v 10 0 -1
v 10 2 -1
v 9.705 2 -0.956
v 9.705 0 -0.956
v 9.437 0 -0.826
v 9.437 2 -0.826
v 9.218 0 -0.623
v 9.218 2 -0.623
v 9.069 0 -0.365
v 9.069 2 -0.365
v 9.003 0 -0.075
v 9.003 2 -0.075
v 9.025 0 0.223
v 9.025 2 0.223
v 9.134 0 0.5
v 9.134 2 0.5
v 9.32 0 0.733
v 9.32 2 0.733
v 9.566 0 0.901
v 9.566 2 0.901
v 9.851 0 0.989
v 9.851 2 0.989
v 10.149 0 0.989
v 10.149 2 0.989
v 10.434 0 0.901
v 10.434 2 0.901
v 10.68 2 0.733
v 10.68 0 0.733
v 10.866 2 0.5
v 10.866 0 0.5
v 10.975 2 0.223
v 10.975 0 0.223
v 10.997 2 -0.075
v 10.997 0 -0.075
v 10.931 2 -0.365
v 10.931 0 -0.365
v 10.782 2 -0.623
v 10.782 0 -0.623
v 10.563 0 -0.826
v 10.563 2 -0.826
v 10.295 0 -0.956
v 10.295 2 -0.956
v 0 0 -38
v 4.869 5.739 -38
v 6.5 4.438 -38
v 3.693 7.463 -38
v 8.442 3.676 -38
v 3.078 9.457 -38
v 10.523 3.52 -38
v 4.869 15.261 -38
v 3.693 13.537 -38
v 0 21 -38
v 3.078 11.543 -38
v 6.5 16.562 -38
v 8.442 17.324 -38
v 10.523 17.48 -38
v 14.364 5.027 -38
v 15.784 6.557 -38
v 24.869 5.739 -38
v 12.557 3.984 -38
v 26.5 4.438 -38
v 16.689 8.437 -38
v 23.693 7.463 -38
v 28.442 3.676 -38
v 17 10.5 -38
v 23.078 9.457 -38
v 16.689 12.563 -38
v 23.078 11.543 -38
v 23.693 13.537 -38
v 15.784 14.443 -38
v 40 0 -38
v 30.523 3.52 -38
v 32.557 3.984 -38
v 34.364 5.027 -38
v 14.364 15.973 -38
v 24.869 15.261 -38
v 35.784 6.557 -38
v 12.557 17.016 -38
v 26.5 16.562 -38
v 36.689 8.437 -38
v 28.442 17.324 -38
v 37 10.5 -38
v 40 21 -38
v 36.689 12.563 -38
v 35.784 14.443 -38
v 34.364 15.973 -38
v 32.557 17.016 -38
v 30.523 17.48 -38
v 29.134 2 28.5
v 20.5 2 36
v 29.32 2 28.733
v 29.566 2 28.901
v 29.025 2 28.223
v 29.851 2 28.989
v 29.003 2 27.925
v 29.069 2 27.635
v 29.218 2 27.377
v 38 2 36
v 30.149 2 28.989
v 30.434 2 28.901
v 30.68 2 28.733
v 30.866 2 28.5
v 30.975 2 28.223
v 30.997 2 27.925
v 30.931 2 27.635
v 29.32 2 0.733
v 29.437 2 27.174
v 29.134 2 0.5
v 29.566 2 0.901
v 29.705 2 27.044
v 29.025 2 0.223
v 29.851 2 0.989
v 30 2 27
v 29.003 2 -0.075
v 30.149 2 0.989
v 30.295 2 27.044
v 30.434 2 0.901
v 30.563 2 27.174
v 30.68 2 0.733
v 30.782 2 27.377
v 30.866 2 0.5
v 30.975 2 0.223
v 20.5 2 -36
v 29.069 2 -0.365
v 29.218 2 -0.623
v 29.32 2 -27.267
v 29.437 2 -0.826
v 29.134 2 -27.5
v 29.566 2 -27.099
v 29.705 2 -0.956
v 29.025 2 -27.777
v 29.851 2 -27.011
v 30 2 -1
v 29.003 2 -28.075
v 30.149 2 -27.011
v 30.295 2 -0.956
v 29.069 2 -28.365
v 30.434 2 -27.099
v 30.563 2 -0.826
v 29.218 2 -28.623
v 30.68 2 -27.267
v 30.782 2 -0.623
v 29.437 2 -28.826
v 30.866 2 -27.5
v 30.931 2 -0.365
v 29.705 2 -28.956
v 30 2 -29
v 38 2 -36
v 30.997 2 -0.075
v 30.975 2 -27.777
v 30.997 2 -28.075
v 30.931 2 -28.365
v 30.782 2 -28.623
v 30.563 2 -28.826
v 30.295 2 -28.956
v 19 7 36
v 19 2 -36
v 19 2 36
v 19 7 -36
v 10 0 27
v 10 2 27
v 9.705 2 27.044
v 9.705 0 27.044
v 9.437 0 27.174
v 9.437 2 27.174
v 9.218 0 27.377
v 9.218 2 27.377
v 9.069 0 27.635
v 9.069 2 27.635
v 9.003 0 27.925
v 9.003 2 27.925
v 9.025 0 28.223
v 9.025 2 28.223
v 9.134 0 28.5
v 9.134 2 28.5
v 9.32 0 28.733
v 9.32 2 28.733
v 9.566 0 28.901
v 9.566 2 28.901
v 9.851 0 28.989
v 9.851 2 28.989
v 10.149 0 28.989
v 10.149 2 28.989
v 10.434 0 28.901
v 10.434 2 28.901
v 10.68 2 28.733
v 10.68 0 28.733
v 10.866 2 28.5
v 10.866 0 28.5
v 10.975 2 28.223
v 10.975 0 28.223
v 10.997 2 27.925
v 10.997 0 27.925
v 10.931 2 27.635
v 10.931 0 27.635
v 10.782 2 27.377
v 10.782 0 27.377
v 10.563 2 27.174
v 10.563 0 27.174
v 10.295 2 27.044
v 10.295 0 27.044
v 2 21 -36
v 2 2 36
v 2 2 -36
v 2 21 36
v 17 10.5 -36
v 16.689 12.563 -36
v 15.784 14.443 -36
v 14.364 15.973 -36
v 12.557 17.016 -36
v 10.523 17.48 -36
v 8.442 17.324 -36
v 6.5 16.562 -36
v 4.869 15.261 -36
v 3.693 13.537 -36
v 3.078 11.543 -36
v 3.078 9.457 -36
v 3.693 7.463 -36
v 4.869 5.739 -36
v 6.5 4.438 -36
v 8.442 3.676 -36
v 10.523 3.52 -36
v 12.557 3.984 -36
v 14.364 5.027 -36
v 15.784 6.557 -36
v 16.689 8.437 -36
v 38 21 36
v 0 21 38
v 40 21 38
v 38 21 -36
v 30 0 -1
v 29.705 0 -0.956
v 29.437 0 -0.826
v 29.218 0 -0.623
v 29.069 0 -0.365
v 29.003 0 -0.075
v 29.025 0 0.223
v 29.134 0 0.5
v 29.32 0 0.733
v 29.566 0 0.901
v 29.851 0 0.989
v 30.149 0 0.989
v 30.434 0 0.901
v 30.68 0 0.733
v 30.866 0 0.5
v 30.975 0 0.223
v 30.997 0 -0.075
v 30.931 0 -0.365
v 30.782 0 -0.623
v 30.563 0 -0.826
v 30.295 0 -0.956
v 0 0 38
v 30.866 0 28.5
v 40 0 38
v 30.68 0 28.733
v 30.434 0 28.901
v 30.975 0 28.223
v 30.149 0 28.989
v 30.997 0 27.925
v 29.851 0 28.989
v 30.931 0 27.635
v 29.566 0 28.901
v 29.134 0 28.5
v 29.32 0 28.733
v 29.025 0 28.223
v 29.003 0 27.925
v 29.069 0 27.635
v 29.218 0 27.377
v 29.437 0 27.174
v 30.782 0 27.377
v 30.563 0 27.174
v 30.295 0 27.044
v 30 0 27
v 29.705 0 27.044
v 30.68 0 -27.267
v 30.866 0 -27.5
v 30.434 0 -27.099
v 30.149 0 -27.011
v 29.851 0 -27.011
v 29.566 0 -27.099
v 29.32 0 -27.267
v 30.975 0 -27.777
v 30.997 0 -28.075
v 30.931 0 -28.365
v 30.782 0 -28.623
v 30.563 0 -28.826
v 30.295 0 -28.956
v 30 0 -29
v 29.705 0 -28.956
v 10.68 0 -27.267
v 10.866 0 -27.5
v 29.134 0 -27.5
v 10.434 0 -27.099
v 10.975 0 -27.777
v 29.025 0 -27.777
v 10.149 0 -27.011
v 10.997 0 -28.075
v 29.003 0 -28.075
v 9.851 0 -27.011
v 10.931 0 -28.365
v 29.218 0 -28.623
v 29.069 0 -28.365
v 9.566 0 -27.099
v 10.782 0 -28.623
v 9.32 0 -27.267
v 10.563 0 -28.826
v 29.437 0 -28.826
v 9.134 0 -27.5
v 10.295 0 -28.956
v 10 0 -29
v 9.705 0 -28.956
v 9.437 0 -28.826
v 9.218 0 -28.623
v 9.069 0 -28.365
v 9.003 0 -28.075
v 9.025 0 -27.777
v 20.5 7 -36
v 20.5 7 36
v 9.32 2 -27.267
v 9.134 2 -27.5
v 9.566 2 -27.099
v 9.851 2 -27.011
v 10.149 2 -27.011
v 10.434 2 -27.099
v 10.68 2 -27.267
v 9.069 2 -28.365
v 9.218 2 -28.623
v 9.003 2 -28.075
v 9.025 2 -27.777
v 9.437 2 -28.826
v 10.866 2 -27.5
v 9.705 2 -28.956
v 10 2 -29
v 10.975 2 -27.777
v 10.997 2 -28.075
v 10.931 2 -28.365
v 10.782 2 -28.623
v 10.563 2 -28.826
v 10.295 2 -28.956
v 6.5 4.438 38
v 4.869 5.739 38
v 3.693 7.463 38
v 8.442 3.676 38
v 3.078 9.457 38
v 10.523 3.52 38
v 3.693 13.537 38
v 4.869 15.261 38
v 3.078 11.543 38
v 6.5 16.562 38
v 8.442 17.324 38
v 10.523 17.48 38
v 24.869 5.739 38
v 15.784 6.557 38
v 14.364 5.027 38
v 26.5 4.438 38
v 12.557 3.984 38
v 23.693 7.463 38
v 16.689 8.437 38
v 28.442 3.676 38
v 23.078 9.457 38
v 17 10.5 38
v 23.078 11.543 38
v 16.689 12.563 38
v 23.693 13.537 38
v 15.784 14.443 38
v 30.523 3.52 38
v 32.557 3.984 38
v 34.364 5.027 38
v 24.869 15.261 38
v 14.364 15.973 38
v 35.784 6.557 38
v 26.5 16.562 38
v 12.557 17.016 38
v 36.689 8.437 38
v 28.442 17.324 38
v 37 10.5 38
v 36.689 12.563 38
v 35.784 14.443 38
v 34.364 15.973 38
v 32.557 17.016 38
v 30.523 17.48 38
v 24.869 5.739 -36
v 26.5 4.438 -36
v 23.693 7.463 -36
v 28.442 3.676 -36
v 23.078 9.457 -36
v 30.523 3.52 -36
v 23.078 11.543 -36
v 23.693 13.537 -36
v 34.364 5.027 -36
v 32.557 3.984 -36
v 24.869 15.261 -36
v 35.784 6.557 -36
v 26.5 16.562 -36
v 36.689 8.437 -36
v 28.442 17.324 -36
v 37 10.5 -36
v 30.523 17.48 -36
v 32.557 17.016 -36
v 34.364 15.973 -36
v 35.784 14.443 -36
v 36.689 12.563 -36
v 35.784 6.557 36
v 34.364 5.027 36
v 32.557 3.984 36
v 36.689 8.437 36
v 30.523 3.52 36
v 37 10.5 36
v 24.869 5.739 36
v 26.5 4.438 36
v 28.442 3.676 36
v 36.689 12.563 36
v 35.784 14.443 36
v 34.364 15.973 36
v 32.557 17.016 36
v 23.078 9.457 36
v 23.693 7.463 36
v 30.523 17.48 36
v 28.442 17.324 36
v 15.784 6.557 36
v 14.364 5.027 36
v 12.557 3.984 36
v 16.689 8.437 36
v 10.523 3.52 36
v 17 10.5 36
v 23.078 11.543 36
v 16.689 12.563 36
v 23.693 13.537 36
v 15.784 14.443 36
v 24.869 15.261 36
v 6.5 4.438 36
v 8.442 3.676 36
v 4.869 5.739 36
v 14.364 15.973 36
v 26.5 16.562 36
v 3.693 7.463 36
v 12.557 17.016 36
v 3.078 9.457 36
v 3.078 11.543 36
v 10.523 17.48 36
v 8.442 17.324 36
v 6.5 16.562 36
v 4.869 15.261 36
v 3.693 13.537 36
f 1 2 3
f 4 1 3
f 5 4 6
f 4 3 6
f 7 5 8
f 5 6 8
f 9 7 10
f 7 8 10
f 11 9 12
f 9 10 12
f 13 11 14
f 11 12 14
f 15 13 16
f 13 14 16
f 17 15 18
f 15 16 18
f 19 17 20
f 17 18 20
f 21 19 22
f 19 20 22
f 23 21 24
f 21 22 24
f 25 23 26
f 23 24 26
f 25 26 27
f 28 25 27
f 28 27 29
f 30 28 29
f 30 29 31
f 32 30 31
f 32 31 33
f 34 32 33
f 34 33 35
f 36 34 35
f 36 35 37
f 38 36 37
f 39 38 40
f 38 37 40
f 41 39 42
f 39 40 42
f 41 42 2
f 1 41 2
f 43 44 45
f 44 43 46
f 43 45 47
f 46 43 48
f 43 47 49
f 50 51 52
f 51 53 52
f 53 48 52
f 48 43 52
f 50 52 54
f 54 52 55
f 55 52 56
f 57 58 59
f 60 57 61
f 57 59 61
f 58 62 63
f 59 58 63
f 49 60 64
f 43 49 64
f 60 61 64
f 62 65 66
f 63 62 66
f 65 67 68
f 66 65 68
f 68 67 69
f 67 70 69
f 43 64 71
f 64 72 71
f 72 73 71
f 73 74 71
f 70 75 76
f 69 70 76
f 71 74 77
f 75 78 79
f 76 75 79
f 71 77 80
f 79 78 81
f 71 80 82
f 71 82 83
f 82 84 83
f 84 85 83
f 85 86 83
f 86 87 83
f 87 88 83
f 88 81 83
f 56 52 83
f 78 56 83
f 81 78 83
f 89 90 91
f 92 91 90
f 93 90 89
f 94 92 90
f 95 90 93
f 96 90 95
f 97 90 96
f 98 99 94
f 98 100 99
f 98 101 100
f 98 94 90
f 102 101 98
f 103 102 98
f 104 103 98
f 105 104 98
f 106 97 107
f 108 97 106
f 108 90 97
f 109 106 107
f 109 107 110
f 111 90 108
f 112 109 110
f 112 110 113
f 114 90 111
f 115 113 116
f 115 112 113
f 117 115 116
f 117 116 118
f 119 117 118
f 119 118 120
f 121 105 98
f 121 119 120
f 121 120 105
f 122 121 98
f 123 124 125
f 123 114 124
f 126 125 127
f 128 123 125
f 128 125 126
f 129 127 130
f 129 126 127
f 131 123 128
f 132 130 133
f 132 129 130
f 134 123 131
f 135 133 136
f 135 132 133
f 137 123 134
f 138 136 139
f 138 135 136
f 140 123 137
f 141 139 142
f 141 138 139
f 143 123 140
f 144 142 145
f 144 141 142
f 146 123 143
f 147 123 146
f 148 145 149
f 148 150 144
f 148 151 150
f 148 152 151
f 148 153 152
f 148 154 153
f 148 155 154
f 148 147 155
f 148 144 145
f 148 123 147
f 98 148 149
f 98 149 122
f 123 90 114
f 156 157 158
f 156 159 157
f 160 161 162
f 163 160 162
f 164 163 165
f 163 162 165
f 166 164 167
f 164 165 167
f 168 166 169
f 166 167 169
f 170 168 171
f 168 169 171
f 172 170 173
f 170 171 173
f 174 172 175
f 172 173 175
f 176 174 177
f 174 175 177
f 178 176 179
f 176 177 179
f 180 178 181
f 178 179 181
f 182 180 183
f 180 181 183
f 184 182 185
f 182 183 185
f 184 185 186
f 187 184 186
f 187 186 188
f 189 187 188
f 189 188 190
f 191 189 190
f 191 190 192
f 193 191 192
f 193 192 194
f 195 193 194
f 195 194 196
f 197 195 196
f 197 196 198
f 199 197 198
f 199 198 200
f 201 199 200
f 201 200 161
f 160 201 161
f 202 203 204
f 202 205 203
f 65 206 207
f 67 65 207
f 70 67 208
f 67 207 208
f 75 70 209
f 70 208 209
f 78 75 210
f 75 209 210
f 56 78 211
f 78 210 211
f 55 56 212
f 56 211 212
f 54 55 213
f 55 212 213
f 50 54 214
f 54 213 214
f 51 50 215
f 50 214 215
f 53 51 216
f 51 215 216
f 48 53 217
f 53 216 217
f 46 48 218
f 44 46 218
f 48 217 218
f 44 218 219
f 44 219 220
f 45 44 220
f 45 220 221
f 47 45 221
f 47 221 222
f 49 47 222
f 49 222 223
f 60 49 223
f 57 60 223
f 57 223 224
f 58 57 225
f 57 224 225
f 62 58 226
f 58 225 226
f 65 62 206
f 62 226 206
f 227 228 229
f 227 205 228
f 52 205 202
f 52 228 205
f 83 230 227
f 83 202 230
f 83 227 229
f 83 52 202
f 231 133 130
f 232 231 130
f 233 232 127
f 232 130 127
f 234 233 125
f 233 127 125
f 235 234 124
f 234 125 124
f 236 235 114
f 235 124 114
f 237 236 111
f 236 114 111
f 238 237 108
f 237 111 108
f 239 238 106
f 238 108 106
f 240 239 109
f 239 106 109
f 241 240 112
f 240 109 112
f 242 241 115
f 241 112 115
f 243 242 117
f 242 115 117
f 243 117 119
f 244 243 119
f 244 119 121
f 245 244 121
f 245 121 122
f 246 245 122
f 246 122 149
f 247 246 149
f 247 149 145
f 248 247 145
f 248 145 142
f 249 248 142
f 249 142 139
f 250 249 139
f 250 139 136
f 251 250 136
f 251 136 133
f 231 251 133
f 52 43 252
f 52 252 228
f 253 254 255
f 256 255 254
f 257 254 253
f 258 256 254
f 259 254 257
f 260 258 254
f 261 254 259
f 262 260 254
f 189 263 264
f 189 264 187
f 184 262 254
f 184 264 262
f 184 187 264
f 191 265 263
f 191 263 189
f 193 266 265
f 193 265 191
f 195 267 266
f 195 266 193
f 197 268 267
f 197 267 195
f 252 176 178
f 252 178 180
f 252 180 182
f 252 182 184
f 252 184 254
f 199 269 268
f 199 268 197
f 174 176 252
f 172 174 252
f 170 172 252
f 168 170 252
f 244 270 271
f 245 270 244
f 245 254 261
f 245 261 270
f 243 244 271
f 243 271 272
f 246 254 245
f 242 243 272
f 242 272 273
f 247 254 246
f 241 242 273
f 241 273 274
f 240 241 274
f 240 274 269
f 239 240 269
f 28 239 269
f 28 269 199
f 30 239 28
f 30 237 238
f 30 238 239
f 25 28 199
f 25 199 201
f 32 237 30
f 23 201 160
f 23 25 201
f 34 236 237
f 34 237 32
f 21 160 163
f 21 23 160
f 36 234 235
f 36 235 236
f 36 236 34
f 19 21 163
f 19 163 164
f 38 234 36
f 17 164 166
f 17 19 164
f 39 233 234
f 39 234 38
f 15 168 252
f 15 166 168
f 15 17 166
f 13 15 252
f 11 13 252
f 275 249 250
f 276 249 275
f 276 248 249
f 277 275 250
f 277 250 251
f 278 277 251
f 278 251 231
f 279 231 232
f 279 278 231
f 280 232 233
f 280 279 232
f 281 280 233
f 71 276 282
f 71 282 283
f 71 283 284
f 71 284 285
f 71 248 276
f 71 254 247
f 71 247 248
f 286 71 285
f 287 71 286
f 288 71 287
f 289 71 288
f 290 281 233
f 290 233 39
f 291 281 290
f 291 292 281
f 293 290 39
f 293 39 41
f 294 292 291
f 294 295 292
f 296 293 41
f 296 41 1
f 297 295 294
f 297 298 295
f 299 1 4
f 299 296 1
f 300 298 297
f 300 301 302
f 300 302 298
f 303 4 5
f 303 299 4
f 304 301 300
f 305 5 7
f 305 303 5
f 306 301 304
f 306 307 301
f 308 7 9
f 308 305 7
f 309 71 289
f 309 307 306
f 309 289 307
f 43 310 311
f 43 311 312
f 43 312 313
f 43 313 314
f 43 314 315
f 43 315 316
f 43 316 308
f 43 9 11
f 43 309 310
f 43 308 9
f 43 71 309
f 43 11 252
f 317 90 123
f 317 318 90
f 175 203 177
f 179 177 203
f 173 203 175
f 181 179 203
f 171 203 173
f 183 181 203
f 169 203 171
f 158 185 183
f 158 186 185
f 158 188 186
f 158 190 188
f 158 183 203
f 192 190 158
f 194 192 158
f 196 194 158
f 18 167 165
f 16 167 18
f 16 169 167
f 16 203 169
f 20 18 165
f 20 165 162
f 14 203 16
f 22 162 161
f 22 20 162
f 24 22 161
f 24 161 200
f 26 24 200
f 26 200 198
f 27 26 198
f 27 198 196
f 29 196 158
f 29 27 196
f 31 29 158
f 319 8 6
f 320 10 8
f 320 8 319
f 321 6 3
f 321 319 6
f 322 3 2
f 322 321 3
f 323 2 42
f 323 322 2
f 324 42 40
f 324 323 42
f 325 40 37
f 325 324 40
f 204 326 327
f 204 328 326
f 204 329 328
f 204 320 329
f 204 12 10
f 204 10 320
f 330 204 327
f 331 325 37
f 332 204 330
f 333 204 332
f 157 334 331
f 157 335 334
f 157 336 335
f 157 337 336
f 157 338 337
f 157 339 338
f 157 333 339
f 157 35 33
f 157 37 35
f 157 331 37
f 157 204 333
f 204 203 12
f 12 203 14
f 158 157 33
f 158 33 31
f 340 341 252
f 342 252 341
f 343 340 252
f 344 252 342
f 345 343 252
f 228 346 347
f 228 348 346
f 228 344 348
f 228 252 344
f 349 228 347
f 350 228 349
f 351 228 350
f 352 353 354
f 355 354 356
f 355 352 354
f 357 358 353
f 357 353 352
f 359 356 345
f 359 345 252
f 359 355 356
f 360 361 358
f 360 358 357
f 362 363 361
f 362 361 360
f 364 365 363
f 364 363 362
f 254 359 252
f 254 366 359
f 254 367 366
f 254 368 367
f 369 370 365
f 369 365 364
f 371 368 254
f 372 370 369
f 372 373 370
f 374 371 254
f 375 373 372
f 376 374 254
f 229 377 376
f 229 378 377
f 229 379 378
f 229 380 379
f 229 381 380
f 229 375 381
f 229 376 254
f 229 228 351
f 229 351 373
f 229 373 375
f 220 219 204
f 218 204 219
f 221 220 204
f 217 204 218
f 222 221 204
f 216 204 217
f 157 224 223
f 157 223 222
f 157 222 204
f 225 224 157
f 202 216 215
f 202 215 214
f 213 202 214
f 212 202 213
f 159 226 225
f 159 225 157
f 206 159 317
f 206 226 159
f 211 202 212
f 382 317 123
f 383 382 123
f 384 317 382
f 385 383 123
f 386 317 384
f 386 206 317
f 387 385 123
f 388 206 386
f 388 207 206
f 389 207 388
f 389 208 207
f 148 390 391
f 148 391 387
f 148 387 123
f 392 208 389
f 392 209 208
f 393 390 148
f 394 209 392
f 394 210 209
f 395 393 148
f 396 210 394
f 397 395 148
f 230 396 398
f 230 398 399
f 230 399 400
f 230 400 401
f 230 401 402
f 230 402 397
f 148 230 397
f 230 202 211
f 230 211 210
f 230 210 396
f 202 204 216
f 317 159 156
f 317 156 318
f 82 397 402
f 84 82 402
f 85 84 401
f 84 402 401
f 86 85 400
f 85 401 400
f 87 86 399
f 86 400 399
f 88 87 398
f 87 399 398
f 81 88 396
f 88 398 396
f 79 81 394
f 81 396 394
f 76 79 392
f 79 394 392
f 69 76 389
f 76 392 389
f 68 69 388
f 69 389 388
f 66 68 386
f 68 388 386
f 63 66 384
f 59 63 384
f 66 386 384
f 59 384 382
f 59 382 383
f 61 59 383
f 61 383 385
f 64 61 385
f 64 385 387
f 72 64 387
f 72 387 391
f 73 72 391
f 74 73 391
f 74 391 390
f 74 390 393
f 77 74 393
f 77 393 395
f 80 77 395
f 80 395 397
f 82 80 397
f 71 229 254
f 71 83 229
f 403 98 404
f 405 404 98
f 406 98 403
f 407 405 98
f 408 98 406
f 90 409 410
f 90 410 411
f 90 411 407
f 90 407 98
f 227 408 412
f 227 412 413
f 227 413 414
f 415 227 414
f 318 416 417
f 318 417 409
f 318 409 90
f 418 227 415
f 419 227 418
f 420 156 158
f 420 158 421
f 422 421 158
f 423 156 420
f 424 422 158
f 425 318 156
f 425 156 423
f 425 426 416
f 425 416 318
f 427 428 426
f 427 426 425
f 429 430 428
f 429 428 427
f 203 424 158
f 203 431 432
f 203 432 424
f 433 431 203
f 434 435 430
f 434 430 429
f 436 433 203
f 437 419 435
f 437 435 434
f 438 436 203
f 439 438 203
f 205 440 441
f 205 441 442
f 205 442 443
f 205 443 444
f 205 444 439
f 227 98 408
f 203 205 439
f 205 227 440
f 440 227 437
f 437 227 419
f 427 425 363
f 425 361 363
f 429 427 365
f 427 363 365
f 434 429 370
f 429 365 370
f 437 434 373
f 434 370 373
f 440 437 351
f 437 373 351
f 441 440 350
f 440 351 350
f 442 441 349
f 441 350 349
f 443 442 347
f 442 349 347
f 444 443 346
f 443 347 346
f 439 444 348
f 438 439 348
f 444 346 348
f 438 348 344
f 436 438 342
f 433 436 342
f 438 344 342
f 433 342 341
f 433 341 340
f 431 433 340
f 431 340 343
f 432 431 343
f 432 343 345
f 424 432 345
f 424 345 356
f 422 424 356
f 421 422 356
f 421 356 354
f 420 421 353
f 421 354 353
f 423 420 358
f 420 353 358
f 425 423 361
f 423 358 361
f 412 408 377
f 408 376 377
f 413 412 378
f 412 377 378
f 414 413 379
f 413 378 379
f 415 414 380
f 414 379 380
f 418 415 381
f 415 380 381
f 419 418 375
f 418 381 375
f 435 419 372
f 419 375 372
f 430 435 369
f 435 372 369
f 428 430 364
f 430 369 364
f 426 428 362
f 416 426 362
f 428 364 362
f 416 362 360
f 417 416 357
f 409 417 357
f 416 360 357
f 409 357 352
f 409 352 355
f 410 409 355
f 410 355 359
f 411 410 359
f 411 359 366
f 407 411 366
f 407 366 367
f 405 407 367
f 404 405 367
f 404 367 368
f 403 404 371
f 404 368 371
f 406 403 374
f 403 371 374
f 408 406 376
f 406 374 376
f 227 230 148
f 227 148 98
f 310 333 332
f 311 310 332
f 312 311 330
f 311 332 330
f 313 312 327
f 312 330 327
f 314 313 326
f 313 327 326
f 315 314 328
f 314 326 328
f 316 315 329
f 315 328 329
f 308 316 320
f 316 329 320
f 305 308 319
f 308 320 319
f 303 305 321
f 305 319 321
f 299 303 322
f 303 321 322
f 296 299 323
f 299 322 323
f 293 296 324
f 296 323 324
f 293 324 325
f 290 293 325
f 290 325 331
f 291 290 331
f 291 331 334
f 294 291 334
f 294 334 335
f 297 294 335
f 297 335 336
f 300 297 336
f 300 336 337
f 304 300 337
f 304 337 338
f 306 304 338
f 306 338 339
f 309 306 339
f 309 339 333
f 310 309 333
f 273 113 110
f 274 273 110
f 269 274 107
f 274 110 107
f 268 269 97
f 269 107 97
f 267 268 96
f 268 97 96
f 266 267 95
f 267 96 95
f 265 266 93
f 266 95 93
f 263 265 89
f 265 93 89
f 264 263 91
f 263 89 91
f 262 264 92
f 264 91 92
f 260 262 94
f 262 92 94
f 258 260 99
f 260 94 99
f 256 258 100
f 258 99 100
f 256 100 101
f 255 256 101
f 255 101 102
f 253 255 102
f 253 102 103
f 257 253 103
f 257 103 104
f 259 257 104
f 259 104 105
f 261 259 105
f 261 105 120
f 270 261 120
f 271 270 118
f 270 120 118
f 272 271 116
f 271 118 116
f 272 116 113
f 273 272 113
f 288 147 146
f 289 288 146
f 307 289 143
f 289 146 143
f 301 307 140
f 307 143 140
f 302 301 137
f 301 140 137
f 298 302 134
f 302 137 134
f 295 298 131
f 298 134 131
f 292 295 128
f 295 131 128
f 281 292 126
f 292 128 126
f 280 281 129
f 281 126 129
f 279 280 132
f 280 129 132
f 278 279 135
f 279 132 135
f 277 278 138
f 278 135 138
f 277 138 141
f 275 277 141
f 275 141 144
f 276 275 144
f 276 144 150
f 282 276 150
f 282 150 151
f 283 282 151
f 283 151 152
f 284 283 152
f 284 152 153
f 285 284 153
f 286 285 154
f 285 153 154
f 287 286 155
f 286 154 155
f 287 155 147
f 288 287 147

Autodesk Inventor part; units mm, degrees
ref_plane "YZ Plane" through (0, 0, 0) normal (1, 0, 0) x (0, 1, 0)
ref_plane "XZ Plane" through (0, 0, 0) normal (0, 1, 0) x (-1, 0, 0)
ref_plane "XY Plane" through (0, 0, 0) normal (0, 0, 1) x (1, 0, 0)
sketch "Esquisse1" plane through (0, 0, 0) normal (0, 0, 1) x (1, 0, 0)
  line L0 (0, 21) -> (40, 21)
  line L1 (40, 21) -> (40, 0)
  line L2 (40, 0) -> (0, 0)
  line L3 (0, 0) -> (0, 21)
  line L4 (-8, 0) -> (48, 0) projected
  line L5 (0, -4.2) -> (0, 25.2) projected
  point P0 (0, 0)
  dimension "d0" = 40
  dimension "d1" = 21
extrude "Extrusion1" add sketch "Esquisse1" along normal mid plane 76
sketch "Esquisse2" plane through (0, 0, 38) normal (0, 0, 1) x (1, 0, 0)
  circle A0 centre (10, 10.5) radius 7
  circle A1 centre (30, 10.5) radius 7
  line L0 (40, 21) -> (0, 21) projected
  line L1 (0, 21) -> (0, 0) projected
  line L2 (40, 0) -> (40, 21) projected
  line L3 (0, 0) -> (40, 0) projected
  dimension "d4" = 14
  dimension "d5" = 14
  dimension "d11" = 10.5
  dimension "d20" = 10.5
  dimension "d21" = 20
extrude "Extrusion2" cut sketch "Esquisse2" against normal through all contours A0 | A1
sketch "Esquisse3" plane through (0, 21, 38) normal (0, 1, 0) x (1, 0, 0)
  line L0 (2, 74) -> (38, 74)
  line L1 (38, 74) -> (38, 2)
  line L2 (38, 2) -> (2, 2)
  line L3 (2, 2) -> (2, 74)
  line L4 (0, 76) -> (40, 76) projected
  line L5 (40, 0) -> (0, 0) projected
  line L6 (40, 76) -> (40, 0) projected
  line L7 (0, 76) -> (0, 0) projected
  point P0 (0, 38)
  dimension "d14" = 2
  dimension "d15" = 2
  dimension "d16" = 2
  dimension "d17" = 2
extrude "Extrusion3" cut sketch "Esquisse3" against normal blind 14 contours L0 L1 L2 L3
sketch "Esquisse4" plane through (0, 7, 38) normal (0, 1, 0) x (1, 0, 0)
  line L0 (2, 74) -> (19, 74)
  line L1 (19, 74) -> (19, 2)
  line L2 (19, 2) -> (2, 2)
  line L3 (2, 2) -> (2, 74)
  line L4 (20.5, 74) -> (38, 74)
  line L5 (38, 74) -> (38, 2)
  line L6 (38, 2) -> (20.5, 2)
  line L7 (20.5, 2) -> (20.5, 74)
  line L8 (2, 74) -> (38, 74) projected
  line L9 (2, 2) -> (2, 74) projected
  line L10 (38, 74) -> (38, 2) projected
  line L11 (38, 2) -> (2, 2) projected
  point P0 (0, 38)
  dimension "d22" = 1.5
  dimension "d23" = 17
extrude "Extrusion4" cut sketch "Esquisse4" against normal blind 5 contours L0 L1 L2 L3 | L4 L5 L6 L7
sketch "Esquisse5" plane through (0, 0, 38) normal (0, -1, 0) x (1, 0, 0)
  line L0 (0, 0) -> (40, 0) projected
  line L1 (0, 0) -> (0, -76) projected
  line L2 (40, -76) -> (40, 0) projected
  line L3 (40, -76) -> (0, -76) projected
  point P0 (0, -38)
  point P1 (10, -10)
  point P2 (10, -38)
  point P3 (30, -38)
  point P4 (30, -66)
  point P5 (30, -10)
  point P6 (10, -66)
  dimension "d26" = 28
  dimension "d27" = 28
  dimension "d28" = 10
  dimension "d29" = 10
  dimension "d30" = 10
  dimension "d31" = 10
  dimension "d32" = 20
  dimension "d33" = 38
  dimension "d41" = 28
  dimension "d42" = 28
  dimension "d43" = 20
hole "Perçage1" at (10, 0, 28) at (10, 0, 0) at (30, 0, 0) at (30, 0, -28) at (10, 0, -28) at (30, 0, 28) direction (0, 1, 0) diameter 2 end through all
equation "\"d5\" = d4"
equation "\"d11\" = d20"
equation "\"d15\" = d14"
equation "\"d16\" = d15"
equation "\"d17\" = d16"
equation "\"d27\" = d26"
equation "\"d29\" = d28"
equation "\"d30\" = d28"
equation "\"d31\" = d28"
equation "\"d41\" = d26"
equation "\"d42\" = d26"
equation "\"d43\" = d32"
properties part number "support pile"
